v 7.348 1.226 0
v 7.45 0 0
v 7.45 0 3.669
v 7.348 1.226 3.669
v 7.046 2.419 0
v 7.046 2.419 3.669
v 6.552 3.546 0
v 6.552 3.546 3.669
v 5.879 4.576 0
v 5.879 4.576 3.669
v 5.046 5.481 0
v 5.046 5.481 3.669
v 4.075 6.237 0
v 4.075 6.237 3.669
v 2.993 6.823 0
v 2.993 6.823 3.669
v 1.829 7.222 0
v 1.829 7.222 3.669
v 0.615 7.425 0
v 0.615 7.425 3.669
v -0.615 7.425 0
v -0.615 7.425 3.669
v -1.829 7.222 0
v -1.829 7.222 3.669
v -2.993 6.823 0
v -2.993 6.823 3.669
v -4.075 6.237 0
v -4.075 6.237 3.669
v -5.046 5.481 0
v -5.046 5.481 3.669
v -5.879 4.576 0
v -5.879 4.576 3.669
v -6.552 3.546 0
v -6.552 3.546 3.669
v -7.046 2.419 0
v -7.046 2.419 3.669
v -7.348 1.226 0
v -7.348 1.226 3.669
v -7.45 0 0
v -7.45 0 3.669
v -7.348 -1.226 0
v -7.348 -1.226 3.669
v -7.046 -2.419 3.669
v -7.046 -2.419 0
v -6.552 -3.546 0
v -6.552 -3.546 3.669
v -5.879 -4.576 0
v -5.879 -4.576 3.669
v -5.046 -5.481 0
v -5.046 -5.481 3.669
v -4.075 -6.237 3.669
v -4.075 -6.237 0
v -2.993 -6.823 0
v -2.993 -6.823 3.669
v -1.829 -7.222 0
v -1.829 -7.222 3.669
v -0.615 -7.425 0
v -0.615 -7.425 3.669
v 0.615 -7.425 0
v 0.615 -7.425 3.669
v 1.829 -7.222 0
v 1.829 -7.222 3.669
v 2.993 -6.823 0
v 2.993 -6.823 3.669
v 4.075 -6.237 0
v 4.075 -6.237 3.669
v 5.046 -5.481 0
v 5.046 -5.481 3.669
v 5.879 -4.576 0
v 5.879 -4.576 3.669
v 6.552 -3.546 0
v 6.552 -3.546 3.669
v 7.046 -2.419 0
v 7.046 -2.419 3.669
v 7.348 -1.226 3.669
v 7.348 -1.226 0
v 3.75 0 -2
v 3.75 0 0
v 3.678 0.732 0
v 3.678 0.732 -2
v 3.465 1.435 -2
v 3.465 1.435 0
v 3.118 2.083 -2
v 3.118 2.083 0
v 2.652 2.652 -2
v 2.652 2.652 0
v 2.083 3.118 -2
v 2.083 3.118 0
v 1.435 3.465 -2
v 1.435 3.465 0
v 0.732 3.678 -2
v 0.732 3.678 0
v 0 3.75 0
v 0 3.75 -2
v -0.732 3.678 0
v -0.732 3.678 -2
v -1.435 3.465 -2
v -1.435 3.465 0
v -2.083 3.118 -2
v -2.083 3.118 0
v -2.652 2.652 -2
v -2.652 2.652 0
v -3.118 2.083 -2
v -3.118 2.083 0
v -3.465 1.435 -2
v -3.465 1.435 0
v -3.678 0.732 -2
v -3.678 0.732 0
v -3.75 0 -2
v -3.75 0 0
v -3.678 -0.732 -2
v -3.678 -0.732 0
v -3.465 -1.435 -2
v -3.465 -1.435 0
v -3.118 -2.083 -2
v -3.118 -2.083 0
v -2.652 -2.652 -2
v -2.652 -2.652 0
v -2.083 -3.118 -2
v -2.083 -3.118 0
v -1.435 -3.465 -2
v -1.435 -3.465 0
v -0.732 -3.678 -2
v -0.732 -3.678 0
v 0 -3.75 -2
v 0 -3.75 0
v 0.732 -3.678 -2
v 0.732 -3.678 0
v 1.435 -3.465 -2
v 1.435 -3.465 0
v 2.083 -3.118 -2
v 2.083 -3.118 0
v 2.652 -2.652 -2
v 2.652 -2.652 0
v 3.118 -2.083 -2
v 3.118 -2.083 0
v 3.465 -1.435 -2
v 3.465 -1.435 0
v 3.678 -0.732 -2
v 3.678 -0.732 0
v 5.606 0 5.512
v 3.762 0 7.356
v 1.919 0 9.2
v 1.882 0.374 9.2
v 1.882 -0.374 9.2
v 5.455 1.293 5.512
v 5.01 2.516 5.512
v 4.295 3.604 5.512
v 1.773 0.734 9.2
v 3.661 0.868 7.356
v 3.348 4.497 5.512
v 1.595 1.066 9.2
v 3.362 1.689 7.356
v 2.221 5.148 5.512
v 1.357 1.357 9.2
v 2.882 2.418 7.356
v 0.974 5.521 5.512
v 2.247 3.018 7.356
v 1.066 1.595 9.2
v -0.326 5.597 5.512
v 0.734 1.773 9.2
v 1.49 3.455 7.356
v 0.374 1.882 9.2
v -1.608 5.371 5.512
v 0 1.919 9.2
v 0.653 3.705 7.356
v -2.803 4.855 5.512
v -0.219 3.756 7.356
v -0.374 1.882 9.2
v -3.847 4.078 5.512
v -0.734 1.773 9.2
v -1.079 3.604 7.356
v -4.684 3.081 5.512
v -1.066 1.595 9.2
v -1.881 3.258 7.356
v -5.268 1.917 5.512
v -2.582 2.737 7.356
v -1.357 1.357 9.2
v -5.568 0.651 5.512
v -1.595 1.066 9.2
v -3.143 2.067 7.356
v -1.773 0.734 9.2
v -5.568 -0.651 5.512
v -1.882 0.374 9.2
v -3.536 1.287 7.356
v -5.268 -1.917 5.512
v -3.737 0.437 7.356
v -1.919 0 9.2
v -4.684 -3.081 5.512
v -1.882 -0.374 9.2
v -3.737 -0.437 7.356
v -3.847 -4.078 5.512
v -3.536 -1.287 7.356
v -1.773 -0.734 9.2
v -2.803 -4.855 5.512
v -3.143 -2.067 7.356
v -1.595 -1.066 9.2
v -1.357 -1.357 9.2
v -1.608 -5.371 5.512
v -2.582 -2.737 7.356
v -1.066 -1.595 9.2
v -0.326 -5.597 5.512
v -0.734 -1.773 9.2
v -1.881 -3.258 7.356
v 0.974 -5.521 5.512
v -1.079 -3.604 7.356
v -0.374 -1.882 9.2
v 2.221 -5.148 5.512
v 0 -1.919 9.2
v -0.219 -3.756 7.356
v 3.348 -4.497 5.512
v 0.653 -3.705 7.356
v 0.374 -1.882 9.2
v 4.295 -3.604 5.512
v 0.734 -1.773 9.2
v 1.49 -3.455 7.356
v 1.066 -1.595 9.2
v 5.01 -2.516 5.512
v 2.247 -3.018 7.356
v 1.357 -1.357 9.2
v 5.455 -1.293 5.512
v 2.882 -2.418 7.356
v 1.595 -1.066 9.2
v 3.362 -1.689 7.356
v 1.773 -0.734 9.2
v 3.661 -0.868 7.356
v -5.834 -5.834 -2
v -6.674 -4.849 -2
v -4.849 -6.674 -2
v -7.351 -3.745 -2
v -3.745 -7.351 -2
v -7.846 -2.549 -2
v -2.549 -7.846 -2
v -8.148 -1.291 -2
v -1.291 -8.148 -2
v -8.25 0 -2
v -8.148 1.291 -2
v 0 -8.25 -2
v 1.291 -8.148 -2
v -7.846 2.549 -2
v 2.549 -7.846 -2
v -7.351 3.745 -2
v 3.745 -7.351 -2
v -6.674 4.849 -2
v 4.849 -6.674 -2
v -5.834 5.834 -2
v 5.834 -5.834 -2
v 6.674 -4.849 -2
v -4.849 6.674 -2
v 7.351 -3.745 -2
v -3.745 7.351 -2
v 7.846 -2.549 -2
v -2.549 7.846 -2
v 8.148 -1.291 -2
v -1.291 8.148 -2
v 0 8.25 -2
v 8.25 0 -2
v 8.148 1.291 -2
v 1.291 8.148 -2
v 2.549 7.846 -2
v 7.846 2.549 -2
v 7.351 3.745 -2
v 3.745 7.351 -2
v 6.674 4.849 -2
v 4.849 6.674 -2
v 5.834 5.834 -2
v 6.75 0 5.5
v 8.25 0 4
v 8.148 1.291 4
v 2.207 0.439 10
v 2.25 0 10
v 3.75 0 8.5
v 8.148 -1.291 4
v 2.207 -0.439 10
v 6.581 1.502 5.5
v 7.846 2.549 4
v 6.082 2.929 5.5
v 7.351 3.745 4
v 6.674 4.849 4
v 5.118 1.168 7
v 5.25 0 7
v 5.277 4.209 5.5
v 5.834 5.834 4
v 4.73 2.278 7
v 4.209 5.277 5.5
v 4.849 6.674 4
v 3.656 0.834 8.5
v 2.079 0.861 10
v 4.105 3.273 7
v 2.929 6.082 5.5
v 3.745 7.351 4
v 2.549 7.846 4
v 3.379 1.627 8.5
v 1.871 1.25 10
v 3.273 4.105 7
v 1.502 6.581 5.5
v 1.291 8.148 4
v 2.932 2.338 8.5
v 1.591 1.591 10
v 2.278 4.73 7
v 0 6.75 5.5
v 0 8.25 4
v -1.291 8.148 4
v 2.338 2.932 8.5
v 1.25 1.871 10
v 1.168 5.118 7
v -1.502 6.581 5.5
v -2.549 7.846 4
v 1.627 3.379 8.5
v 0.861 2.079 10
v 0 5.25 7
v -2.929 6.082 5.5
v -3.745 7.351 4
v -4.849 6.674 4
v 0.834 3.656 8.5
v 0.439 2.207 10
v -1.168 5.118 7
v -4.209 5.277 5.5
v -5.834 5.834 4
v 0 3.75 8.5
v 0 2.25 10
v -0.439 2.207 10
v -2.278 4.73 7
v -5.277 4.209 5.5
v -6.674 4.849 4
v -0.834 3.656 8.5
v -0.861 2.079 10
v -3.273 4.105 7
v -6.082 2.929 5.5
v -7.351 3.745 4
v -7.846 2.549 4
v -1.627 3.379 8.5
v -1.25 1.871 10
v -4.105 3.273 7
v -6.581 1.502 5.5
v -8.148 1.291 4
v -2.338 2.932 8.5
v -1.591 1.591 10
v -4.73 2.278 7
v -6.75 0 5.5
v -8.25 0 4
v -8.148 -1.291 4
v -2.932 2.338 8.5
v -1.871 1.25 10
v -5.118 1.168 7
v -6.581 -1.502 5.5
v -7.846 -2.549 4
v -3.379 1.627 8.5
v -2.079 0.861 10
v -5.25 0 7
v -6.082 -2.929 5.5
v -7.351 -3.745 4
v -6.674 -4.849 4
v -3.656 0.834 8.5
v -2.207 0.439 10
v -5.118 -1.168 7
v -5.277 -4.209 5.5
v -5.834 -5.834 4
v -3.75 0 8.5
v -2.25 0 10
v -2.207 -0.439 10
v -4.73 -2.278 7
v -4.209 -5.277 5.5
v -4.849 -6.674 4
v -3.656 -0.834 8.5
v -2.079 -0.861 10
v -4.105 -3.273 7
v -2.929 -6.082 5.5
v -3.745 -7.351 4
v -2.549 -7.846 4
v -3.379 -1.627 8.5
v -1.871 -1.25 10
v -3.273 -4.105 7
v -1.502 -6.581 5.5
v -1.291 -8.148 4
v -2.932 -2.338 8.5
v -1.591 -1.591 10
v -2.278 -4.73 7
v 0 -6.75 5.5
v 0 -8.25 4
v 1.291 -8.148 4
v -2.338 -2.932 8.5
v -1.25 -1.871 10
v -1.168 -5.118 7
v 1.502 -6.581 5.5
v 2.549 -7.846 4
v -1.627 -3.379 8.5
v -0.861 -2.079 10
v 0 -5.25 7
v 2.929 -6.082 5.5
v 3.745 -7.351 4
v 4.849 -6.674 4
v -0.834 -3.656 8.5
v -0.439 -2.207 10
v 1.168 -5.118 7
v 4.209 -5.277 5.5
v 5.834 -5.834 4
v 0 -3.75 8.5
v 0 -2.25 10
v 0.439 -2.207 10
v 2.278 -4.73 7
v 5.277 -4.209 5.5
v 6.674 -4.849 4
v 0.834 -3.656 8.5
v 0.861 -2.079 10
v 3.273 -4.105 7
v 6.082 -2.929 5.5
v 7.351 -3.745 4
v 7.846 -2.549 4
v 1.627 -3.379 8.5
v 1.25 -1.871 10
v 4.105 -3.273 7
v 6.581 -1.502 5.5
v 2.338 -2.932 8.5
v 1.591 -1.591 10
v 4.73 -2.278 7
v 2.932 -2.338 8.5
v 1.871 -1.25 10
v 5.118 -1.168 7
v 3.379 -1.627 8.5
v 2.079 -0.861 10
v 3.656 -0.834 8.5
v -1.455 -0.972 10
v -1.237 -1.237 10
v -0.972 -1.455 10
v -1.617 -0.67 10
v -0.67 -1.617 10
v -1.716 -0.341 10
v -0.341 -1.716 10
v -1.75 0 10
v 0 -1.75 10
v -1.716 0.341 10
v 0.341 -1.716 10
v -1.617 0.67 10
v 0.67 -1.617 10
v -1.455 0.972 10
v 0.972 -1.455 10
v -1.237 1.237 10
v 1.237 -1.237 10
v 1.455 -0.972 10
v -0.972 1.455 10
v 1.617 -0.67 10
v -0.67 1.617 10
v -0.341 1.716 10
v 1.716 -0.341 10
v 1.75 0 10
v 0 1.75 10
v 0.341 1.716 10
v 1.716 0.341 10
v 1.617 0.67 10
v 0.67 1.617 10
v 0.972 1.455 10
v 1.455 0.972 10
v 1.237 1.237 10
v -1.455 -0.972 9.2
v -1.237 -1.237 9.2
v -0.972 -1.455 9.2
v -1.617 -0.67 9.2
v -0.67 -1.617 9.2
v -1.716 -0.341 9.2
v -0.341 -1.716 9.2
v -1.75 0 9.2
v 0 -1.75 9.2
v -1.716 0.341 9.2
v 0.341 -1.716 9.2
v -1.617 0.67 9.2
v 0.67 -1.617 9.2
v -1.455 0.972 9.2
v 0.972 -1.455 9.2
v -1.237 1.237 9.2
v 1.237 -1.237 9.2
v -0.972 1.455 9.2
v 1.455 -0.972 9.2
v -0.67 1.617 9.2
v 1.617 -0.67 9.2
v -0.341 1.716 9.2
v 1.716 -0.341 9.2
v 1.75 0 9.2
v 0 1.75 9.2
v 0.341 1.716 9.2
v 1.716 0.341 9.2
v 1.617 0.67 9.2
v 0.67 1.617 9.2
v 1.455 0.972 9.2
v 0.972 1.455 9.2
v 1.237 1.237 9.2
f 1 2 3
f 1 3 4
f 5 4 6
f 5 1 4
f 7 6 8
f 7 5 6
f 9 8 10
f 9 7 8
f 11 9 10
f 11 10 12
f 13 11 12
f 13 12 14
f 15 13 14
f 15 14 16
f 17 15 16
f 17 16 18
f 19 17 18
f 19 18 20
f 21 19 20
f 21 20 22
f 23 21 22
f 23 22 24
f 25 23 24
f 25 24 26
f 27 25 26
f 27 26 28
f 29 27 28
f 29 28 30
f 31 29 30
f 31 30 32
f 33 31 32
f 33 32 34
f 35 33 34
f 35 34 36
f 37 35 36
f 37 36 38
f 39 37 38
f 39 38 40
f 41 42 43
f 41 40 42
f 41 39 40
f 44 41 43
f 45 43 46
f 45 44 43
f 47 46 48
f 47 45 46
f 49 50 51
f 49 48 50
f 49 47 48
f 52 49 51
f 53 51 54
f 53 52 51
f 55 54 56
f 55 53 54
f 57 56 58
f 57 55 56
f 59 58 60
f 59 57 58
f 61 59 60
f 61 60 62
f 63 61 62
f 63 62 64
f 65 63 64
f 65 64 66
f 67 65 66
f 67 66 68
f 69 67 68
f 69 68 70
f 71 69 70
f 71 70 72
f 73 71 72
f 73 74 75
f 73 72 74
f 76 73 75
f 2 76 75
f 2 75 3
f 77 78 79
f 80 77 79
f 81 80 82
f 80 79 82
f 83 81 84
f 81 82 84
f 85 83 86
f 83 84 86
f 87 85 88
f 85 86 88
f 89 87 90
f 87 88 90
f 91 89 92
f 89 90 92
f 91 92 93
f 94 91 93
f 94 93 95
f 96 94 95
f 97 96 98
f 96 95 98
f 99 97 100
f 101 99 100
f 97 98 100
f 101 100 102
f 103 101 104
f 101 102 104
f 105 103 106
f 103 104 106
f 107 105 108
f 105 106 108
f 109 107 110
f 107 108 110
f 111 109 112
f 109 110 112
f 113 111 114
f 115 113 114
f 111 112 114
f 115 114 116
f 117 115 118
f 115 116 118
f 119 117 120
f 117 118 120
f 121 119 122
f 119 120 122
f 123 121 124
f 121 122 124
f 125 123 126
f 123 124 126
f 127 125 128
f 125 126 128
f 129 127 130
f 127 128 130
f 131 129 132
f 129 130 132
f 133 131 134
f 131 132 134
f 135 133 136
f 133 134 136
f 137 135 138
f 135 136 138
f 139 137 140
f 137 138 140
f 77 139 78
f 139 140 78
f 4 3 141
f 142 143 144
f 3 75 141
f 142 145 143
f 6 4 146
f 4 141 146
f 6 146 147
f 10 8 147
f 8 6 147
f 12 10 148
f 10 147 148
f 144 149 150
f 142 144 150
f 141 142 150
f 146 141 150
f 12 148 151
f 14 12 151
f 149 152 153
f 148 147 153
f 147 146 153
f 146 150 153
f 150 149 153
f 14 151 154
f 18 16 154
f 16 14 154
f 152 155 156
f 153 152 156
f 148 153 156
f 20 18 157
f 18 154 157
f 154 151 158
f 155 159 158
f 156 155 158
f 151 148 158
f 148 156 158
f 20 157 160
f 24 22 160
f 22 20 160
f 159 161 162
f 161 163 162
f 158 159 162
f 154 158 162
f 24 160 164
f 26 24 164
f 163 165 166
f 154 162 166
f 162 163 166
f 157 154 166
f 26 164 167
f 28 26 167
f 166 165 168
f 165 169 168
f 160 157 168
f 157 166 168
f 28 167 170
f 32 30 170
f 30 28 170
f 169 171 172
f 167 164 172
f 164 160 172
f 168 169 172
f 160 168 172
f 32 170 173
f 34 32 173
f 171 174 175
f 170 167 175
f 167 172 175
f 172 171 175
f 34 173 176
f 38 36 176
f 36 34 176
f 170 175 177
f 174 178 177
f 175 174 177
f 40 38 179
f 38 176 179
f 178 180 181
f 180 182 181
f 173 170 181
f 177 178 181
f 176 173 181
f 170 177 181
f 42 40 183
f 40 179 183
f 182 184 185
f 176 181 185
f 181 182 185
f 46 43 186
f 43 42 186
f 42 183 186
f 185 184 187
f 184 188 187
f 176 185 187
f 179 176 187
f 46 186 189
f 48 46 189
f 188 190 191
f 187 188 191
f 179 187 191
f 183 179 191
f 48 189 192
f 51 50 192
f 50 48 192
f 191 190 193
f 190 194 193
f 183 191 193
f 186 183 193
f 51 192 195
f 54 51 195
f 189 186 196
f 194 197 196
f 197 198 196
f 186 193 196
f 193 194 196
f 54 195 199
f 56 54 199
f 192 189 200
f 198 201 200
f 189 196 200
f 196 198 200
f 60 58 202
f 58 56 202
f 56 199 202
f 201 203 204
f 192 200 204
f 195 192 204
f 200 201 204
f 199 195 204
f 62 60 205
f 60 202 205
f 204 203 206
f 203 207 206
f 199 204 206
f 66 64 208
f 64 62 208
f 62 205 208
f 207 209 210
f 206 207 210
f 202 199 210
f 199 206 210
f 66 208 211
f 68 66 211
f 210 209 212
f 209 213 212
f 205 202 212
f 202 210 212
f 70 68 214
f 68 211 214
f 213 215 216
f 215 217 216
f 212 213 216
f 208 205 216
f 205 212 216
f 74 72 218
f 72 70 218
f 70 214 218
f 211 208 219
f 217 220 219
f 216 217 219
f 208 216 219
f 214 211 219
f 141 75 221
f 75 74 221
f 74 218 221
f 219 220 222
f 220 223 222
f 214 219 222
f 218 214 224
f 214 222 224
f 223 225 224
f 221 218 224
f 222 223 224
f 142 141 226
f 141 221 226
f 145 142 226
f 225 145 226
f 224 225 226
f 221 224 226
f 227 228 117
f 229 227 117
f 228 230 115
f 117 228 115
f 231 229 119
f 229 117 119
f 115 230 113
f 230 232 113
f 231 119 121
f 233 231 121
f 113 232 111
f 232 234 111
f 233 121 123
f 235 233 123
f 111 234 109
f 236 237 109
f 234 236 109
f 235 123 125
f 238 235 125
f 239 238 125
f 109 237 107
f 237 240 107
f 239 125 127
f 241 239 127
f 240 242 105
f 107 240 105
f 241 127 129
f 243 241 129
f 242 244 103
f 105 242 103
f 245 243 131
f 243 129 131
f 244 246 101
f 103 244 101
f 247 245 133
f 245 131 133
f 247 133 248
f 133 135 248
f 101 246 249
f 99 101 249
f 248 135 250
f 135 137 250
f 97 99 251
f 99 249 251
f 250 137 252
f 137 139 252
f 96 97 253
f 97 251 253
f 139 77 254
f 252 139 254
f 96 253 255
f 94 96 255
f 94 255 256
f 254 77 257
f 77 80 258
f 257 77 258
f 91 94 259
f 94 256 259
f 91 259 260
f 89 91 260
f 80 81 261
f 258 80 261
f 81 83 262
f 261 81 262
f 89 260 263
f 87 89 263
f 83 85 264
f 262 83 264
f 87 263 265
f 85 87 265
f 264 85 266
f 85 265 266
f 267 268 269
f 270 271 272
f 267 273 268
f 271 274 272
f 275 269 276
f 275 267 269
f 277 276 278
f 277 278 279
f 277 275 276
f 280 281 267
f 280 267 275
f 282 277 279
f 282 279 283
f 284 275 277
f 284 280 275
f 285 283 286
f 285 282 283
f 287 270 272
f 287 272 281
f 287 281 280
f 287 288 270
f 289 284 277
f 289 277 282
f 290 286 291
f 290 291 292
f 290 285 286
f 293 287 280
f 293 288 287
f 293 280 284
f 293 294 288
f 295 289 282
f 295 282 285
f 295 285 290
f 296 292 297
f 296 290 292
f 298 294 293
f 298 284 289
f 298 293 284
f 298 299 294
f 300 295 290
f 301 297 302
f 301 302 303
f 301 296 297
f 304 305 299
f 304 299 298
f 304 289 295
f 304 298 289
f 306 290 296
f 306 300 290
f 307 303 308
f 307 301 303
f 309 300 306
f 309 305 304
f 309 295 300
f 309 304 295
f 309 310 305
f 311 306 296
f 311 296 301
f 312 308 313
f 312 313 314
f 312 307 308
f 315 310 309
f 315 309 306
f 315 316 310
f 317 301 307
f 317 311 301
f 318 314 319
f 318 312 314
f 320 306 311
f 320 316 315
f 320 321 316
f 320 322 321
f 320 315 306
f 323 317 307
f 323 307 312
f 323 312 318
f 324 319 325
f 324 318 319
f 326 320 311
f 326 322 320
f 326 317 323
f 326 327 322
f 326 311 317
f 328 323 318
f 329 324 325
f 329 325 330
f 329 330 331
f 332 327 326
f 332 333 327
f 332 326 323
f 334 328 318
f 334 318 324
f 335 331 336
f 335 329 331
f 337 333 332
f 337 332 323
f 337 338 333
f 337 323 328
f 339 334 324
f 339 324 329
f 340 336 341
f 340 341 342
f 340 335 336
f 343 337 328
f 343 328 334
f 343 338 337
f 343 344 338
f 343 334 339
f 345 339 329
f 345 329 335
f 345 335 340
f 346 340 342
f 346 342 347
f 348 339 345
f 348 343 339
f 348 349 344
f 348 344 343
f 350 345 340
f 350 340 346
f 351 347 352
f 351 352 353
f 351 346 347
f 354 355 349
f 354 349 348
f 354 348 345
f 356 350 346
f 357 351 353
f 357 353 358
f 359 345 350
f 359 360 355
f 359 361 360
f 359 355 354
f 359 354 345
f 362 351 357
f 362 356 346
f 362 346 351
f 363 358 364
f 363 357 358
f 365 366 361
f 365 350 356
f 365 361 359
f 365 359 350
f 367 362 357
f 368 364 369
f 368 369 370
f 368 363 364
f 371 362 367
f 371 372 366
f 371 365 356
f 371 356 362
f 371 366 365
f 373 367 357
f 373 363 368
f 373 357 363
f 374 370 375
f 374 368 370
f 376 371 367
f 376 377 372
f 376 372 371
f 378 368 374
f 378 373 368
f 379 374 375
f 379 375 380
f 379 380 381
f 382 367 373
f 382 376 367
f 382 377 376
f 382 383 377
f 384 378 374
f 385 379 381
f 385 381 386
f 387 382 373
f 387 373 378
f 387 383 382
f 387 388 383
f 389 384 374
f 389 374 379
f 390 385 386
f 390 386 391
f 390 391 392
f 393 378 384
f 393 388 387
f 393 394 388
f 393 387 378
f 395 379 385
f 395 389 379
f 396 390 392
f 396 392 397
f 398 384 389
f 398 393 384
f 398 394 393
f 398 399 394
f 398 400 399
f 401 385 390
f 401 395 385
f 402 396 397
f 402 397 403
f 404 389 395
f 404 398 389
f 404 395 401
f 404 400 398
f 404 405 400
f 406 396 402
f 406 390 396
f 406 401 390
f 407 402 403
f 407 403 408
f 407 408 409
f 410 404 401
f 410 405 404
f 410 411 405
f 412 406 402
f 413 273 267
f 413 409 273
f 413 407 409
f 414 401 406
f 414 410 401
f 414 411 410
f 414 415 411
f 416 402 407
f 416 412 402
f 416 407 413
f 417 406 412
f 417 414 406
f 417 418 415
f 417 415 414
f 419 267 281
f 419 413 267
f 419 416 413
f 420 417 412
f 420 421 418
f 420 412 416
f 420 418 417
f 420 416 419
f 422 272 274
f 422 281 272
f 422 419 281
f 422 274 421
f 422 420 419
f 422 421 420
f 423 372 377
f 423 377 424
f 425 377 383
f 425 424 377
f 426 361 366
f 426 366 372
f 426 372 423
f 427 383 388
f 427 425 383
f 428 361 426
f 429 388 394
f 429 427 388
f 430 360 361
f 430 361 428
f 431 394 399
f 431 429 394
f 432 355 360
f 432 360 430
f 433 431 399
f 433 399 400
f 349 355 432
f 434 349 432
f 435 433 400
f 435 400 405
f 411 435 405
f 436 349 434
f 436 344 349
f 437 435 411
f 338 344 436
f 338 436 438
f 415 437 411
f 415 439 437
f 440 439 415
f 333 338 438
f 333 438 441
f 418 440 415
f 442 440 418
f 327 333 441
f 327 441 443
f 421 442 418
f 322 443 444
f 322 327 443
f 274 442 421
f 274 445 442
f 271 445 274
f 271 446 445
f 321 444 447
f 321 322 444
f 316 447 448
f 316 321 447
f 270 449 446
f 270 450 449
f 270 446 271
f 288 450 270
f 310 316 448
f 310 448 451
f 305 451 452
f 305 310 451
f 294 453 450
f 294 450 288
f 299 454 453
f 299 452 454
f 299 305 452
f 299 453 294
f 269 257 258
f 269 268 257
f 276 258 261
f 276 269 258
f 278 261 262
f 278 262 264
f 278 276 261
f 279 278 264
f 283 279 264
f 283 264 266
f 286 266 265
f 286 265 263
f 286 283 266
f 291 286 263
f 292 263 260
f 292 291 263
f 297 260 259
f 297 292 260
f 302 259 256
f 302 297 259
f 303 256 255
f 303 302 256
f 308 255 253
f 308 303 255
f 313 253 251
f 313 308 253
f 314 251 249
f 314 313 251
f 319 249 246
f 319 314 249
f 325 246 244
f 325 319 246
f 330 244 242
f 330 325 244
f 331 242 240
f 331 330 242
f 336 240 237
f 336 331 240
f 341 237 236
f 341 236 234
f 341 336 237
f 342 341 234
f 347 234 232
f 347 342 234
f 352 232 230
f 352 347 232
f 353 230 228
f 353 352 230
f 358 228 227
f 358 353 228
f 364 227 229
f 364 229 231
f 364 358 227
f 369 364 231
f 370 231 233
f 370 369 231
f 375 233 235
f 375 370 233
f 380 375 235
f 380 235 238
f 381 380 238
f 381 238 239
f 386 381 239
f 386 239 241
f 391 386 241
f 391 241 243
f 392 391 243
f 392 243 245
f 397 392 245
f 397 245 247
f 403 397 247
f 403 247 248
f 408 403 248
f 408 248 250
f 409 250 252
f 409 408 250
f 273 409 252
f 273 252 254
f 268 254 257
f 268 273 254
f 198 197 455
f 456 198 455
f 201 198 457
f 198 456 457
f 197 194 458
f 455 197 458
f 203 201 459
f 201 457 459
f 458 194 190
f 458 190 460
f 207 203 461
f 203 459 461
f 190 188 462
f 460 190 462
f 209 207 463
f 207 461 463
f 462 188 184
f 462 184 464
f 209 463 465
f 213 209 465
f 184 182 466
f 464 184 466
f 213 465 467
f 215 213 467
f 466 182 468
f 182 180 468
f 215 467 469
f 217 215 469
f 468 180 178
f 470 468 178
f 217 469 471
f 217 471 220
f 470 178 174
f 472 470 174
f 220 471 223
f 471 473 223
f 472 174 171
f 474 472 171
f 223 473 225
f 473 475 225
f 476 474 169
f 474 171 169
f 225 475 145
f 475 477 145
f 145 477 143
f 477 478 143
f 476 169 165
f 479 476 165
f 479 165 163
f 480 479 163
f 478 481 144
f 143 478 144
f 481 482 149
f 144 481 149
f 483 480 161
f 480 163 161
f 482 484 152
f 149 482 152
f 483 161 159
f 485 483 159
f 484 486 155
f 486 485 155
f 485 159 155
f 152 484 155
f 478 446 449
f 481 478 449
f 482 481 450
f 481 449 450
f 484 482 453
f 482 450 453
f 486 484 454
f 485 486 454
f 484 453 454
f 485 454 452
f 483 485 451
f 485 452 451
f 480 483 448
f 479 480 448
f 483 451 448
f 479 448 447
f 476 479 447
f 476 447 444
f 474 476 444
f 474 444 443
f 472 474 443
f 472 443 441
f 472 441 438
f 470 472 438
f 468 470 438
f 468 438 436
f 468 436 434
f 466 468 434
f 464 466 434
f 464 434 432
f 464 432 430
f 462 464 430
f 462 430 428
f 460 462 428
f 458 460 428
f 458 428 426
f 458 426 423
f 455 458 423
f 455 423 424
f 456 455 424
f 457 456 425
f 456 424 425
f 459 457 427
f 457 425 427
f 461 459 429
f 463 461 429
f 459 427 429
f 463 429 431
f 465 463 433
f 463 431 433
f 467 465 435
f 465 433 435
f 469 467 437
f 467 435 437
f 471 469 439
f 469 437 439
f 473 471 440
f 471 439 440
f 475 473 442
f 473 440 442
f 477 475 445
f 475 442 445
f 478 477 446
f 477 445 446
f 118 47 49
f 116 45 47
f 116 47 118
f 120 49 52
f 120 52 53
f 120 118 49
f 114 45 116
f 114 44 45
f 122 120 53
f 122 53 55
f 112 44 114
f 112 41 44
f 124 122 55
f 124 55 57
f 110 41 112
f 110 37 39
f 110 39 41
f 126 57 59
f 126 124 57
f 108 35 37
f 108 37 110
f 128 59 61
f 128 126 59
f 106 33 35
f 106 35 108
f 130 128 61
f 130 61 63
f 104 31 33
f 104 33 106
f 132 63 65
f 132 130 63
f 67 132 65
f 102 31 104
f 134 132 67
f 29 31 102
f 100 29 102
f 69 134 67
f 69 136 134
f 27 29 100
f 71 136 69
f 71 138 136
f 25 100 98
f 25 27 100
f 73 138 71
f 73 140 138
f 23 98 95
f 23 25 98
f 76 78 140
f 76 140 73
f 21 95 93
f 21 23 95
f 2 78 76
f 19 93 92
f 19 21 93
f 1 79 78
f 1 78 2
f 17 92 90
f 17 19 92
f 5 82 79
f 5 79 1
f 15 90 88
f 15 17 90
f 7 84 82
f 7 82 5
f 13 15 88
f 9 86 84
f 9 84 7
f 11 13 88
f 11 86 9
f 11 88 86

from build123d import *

# Parameters (mm, degrees)
F0_R     = 8.25
F1_DEPTH = 10
F2_SIZE  = 6
F3_T     = -0.8
F4_R     = 1.75
F5_DEPTH = 25
F6_R     = 8.25
F6_R_2   = 3.75
F7_DEPTH = 2


with BuildPart() as f1:
    # F0 (on Top) → F1 (new body)
    with BuildSketch(Plane.XY):
        Circle(F0_R)
    extrude(amount=F1_DEPTH)

    # F2
    f2_edges = [f1.edges().sort_by_distance(p)[0] for p in [
        (-8.25, 0, 10),
    ]]
    chamfer(f2_edges, length=F2_SIZE)

    # F3
    f3_openings = [f1.faces().sort_by_distance(p)[0] for p in [
        (0, 0, 0),
    ]]
    offset(amount=F3_T, openings=f3_openings)

    # F4 (on face) → F5 (cut)
    with BuildSketch(Plane.XY.offset(10)):
        Circle(F4_R)
    extrude(amount=-F5_DEPTH, mode=Mode.SUBTRACT)

    # F6 (on Top) → F7 (join)
    with BuildSketch(Plane.XY):
        Circle(F6_R)
        Circle(F6_R_2, mode=Mode.SUBTRACT)
    extrude(amount=-F7_DEPTH)


solid = f1.part
